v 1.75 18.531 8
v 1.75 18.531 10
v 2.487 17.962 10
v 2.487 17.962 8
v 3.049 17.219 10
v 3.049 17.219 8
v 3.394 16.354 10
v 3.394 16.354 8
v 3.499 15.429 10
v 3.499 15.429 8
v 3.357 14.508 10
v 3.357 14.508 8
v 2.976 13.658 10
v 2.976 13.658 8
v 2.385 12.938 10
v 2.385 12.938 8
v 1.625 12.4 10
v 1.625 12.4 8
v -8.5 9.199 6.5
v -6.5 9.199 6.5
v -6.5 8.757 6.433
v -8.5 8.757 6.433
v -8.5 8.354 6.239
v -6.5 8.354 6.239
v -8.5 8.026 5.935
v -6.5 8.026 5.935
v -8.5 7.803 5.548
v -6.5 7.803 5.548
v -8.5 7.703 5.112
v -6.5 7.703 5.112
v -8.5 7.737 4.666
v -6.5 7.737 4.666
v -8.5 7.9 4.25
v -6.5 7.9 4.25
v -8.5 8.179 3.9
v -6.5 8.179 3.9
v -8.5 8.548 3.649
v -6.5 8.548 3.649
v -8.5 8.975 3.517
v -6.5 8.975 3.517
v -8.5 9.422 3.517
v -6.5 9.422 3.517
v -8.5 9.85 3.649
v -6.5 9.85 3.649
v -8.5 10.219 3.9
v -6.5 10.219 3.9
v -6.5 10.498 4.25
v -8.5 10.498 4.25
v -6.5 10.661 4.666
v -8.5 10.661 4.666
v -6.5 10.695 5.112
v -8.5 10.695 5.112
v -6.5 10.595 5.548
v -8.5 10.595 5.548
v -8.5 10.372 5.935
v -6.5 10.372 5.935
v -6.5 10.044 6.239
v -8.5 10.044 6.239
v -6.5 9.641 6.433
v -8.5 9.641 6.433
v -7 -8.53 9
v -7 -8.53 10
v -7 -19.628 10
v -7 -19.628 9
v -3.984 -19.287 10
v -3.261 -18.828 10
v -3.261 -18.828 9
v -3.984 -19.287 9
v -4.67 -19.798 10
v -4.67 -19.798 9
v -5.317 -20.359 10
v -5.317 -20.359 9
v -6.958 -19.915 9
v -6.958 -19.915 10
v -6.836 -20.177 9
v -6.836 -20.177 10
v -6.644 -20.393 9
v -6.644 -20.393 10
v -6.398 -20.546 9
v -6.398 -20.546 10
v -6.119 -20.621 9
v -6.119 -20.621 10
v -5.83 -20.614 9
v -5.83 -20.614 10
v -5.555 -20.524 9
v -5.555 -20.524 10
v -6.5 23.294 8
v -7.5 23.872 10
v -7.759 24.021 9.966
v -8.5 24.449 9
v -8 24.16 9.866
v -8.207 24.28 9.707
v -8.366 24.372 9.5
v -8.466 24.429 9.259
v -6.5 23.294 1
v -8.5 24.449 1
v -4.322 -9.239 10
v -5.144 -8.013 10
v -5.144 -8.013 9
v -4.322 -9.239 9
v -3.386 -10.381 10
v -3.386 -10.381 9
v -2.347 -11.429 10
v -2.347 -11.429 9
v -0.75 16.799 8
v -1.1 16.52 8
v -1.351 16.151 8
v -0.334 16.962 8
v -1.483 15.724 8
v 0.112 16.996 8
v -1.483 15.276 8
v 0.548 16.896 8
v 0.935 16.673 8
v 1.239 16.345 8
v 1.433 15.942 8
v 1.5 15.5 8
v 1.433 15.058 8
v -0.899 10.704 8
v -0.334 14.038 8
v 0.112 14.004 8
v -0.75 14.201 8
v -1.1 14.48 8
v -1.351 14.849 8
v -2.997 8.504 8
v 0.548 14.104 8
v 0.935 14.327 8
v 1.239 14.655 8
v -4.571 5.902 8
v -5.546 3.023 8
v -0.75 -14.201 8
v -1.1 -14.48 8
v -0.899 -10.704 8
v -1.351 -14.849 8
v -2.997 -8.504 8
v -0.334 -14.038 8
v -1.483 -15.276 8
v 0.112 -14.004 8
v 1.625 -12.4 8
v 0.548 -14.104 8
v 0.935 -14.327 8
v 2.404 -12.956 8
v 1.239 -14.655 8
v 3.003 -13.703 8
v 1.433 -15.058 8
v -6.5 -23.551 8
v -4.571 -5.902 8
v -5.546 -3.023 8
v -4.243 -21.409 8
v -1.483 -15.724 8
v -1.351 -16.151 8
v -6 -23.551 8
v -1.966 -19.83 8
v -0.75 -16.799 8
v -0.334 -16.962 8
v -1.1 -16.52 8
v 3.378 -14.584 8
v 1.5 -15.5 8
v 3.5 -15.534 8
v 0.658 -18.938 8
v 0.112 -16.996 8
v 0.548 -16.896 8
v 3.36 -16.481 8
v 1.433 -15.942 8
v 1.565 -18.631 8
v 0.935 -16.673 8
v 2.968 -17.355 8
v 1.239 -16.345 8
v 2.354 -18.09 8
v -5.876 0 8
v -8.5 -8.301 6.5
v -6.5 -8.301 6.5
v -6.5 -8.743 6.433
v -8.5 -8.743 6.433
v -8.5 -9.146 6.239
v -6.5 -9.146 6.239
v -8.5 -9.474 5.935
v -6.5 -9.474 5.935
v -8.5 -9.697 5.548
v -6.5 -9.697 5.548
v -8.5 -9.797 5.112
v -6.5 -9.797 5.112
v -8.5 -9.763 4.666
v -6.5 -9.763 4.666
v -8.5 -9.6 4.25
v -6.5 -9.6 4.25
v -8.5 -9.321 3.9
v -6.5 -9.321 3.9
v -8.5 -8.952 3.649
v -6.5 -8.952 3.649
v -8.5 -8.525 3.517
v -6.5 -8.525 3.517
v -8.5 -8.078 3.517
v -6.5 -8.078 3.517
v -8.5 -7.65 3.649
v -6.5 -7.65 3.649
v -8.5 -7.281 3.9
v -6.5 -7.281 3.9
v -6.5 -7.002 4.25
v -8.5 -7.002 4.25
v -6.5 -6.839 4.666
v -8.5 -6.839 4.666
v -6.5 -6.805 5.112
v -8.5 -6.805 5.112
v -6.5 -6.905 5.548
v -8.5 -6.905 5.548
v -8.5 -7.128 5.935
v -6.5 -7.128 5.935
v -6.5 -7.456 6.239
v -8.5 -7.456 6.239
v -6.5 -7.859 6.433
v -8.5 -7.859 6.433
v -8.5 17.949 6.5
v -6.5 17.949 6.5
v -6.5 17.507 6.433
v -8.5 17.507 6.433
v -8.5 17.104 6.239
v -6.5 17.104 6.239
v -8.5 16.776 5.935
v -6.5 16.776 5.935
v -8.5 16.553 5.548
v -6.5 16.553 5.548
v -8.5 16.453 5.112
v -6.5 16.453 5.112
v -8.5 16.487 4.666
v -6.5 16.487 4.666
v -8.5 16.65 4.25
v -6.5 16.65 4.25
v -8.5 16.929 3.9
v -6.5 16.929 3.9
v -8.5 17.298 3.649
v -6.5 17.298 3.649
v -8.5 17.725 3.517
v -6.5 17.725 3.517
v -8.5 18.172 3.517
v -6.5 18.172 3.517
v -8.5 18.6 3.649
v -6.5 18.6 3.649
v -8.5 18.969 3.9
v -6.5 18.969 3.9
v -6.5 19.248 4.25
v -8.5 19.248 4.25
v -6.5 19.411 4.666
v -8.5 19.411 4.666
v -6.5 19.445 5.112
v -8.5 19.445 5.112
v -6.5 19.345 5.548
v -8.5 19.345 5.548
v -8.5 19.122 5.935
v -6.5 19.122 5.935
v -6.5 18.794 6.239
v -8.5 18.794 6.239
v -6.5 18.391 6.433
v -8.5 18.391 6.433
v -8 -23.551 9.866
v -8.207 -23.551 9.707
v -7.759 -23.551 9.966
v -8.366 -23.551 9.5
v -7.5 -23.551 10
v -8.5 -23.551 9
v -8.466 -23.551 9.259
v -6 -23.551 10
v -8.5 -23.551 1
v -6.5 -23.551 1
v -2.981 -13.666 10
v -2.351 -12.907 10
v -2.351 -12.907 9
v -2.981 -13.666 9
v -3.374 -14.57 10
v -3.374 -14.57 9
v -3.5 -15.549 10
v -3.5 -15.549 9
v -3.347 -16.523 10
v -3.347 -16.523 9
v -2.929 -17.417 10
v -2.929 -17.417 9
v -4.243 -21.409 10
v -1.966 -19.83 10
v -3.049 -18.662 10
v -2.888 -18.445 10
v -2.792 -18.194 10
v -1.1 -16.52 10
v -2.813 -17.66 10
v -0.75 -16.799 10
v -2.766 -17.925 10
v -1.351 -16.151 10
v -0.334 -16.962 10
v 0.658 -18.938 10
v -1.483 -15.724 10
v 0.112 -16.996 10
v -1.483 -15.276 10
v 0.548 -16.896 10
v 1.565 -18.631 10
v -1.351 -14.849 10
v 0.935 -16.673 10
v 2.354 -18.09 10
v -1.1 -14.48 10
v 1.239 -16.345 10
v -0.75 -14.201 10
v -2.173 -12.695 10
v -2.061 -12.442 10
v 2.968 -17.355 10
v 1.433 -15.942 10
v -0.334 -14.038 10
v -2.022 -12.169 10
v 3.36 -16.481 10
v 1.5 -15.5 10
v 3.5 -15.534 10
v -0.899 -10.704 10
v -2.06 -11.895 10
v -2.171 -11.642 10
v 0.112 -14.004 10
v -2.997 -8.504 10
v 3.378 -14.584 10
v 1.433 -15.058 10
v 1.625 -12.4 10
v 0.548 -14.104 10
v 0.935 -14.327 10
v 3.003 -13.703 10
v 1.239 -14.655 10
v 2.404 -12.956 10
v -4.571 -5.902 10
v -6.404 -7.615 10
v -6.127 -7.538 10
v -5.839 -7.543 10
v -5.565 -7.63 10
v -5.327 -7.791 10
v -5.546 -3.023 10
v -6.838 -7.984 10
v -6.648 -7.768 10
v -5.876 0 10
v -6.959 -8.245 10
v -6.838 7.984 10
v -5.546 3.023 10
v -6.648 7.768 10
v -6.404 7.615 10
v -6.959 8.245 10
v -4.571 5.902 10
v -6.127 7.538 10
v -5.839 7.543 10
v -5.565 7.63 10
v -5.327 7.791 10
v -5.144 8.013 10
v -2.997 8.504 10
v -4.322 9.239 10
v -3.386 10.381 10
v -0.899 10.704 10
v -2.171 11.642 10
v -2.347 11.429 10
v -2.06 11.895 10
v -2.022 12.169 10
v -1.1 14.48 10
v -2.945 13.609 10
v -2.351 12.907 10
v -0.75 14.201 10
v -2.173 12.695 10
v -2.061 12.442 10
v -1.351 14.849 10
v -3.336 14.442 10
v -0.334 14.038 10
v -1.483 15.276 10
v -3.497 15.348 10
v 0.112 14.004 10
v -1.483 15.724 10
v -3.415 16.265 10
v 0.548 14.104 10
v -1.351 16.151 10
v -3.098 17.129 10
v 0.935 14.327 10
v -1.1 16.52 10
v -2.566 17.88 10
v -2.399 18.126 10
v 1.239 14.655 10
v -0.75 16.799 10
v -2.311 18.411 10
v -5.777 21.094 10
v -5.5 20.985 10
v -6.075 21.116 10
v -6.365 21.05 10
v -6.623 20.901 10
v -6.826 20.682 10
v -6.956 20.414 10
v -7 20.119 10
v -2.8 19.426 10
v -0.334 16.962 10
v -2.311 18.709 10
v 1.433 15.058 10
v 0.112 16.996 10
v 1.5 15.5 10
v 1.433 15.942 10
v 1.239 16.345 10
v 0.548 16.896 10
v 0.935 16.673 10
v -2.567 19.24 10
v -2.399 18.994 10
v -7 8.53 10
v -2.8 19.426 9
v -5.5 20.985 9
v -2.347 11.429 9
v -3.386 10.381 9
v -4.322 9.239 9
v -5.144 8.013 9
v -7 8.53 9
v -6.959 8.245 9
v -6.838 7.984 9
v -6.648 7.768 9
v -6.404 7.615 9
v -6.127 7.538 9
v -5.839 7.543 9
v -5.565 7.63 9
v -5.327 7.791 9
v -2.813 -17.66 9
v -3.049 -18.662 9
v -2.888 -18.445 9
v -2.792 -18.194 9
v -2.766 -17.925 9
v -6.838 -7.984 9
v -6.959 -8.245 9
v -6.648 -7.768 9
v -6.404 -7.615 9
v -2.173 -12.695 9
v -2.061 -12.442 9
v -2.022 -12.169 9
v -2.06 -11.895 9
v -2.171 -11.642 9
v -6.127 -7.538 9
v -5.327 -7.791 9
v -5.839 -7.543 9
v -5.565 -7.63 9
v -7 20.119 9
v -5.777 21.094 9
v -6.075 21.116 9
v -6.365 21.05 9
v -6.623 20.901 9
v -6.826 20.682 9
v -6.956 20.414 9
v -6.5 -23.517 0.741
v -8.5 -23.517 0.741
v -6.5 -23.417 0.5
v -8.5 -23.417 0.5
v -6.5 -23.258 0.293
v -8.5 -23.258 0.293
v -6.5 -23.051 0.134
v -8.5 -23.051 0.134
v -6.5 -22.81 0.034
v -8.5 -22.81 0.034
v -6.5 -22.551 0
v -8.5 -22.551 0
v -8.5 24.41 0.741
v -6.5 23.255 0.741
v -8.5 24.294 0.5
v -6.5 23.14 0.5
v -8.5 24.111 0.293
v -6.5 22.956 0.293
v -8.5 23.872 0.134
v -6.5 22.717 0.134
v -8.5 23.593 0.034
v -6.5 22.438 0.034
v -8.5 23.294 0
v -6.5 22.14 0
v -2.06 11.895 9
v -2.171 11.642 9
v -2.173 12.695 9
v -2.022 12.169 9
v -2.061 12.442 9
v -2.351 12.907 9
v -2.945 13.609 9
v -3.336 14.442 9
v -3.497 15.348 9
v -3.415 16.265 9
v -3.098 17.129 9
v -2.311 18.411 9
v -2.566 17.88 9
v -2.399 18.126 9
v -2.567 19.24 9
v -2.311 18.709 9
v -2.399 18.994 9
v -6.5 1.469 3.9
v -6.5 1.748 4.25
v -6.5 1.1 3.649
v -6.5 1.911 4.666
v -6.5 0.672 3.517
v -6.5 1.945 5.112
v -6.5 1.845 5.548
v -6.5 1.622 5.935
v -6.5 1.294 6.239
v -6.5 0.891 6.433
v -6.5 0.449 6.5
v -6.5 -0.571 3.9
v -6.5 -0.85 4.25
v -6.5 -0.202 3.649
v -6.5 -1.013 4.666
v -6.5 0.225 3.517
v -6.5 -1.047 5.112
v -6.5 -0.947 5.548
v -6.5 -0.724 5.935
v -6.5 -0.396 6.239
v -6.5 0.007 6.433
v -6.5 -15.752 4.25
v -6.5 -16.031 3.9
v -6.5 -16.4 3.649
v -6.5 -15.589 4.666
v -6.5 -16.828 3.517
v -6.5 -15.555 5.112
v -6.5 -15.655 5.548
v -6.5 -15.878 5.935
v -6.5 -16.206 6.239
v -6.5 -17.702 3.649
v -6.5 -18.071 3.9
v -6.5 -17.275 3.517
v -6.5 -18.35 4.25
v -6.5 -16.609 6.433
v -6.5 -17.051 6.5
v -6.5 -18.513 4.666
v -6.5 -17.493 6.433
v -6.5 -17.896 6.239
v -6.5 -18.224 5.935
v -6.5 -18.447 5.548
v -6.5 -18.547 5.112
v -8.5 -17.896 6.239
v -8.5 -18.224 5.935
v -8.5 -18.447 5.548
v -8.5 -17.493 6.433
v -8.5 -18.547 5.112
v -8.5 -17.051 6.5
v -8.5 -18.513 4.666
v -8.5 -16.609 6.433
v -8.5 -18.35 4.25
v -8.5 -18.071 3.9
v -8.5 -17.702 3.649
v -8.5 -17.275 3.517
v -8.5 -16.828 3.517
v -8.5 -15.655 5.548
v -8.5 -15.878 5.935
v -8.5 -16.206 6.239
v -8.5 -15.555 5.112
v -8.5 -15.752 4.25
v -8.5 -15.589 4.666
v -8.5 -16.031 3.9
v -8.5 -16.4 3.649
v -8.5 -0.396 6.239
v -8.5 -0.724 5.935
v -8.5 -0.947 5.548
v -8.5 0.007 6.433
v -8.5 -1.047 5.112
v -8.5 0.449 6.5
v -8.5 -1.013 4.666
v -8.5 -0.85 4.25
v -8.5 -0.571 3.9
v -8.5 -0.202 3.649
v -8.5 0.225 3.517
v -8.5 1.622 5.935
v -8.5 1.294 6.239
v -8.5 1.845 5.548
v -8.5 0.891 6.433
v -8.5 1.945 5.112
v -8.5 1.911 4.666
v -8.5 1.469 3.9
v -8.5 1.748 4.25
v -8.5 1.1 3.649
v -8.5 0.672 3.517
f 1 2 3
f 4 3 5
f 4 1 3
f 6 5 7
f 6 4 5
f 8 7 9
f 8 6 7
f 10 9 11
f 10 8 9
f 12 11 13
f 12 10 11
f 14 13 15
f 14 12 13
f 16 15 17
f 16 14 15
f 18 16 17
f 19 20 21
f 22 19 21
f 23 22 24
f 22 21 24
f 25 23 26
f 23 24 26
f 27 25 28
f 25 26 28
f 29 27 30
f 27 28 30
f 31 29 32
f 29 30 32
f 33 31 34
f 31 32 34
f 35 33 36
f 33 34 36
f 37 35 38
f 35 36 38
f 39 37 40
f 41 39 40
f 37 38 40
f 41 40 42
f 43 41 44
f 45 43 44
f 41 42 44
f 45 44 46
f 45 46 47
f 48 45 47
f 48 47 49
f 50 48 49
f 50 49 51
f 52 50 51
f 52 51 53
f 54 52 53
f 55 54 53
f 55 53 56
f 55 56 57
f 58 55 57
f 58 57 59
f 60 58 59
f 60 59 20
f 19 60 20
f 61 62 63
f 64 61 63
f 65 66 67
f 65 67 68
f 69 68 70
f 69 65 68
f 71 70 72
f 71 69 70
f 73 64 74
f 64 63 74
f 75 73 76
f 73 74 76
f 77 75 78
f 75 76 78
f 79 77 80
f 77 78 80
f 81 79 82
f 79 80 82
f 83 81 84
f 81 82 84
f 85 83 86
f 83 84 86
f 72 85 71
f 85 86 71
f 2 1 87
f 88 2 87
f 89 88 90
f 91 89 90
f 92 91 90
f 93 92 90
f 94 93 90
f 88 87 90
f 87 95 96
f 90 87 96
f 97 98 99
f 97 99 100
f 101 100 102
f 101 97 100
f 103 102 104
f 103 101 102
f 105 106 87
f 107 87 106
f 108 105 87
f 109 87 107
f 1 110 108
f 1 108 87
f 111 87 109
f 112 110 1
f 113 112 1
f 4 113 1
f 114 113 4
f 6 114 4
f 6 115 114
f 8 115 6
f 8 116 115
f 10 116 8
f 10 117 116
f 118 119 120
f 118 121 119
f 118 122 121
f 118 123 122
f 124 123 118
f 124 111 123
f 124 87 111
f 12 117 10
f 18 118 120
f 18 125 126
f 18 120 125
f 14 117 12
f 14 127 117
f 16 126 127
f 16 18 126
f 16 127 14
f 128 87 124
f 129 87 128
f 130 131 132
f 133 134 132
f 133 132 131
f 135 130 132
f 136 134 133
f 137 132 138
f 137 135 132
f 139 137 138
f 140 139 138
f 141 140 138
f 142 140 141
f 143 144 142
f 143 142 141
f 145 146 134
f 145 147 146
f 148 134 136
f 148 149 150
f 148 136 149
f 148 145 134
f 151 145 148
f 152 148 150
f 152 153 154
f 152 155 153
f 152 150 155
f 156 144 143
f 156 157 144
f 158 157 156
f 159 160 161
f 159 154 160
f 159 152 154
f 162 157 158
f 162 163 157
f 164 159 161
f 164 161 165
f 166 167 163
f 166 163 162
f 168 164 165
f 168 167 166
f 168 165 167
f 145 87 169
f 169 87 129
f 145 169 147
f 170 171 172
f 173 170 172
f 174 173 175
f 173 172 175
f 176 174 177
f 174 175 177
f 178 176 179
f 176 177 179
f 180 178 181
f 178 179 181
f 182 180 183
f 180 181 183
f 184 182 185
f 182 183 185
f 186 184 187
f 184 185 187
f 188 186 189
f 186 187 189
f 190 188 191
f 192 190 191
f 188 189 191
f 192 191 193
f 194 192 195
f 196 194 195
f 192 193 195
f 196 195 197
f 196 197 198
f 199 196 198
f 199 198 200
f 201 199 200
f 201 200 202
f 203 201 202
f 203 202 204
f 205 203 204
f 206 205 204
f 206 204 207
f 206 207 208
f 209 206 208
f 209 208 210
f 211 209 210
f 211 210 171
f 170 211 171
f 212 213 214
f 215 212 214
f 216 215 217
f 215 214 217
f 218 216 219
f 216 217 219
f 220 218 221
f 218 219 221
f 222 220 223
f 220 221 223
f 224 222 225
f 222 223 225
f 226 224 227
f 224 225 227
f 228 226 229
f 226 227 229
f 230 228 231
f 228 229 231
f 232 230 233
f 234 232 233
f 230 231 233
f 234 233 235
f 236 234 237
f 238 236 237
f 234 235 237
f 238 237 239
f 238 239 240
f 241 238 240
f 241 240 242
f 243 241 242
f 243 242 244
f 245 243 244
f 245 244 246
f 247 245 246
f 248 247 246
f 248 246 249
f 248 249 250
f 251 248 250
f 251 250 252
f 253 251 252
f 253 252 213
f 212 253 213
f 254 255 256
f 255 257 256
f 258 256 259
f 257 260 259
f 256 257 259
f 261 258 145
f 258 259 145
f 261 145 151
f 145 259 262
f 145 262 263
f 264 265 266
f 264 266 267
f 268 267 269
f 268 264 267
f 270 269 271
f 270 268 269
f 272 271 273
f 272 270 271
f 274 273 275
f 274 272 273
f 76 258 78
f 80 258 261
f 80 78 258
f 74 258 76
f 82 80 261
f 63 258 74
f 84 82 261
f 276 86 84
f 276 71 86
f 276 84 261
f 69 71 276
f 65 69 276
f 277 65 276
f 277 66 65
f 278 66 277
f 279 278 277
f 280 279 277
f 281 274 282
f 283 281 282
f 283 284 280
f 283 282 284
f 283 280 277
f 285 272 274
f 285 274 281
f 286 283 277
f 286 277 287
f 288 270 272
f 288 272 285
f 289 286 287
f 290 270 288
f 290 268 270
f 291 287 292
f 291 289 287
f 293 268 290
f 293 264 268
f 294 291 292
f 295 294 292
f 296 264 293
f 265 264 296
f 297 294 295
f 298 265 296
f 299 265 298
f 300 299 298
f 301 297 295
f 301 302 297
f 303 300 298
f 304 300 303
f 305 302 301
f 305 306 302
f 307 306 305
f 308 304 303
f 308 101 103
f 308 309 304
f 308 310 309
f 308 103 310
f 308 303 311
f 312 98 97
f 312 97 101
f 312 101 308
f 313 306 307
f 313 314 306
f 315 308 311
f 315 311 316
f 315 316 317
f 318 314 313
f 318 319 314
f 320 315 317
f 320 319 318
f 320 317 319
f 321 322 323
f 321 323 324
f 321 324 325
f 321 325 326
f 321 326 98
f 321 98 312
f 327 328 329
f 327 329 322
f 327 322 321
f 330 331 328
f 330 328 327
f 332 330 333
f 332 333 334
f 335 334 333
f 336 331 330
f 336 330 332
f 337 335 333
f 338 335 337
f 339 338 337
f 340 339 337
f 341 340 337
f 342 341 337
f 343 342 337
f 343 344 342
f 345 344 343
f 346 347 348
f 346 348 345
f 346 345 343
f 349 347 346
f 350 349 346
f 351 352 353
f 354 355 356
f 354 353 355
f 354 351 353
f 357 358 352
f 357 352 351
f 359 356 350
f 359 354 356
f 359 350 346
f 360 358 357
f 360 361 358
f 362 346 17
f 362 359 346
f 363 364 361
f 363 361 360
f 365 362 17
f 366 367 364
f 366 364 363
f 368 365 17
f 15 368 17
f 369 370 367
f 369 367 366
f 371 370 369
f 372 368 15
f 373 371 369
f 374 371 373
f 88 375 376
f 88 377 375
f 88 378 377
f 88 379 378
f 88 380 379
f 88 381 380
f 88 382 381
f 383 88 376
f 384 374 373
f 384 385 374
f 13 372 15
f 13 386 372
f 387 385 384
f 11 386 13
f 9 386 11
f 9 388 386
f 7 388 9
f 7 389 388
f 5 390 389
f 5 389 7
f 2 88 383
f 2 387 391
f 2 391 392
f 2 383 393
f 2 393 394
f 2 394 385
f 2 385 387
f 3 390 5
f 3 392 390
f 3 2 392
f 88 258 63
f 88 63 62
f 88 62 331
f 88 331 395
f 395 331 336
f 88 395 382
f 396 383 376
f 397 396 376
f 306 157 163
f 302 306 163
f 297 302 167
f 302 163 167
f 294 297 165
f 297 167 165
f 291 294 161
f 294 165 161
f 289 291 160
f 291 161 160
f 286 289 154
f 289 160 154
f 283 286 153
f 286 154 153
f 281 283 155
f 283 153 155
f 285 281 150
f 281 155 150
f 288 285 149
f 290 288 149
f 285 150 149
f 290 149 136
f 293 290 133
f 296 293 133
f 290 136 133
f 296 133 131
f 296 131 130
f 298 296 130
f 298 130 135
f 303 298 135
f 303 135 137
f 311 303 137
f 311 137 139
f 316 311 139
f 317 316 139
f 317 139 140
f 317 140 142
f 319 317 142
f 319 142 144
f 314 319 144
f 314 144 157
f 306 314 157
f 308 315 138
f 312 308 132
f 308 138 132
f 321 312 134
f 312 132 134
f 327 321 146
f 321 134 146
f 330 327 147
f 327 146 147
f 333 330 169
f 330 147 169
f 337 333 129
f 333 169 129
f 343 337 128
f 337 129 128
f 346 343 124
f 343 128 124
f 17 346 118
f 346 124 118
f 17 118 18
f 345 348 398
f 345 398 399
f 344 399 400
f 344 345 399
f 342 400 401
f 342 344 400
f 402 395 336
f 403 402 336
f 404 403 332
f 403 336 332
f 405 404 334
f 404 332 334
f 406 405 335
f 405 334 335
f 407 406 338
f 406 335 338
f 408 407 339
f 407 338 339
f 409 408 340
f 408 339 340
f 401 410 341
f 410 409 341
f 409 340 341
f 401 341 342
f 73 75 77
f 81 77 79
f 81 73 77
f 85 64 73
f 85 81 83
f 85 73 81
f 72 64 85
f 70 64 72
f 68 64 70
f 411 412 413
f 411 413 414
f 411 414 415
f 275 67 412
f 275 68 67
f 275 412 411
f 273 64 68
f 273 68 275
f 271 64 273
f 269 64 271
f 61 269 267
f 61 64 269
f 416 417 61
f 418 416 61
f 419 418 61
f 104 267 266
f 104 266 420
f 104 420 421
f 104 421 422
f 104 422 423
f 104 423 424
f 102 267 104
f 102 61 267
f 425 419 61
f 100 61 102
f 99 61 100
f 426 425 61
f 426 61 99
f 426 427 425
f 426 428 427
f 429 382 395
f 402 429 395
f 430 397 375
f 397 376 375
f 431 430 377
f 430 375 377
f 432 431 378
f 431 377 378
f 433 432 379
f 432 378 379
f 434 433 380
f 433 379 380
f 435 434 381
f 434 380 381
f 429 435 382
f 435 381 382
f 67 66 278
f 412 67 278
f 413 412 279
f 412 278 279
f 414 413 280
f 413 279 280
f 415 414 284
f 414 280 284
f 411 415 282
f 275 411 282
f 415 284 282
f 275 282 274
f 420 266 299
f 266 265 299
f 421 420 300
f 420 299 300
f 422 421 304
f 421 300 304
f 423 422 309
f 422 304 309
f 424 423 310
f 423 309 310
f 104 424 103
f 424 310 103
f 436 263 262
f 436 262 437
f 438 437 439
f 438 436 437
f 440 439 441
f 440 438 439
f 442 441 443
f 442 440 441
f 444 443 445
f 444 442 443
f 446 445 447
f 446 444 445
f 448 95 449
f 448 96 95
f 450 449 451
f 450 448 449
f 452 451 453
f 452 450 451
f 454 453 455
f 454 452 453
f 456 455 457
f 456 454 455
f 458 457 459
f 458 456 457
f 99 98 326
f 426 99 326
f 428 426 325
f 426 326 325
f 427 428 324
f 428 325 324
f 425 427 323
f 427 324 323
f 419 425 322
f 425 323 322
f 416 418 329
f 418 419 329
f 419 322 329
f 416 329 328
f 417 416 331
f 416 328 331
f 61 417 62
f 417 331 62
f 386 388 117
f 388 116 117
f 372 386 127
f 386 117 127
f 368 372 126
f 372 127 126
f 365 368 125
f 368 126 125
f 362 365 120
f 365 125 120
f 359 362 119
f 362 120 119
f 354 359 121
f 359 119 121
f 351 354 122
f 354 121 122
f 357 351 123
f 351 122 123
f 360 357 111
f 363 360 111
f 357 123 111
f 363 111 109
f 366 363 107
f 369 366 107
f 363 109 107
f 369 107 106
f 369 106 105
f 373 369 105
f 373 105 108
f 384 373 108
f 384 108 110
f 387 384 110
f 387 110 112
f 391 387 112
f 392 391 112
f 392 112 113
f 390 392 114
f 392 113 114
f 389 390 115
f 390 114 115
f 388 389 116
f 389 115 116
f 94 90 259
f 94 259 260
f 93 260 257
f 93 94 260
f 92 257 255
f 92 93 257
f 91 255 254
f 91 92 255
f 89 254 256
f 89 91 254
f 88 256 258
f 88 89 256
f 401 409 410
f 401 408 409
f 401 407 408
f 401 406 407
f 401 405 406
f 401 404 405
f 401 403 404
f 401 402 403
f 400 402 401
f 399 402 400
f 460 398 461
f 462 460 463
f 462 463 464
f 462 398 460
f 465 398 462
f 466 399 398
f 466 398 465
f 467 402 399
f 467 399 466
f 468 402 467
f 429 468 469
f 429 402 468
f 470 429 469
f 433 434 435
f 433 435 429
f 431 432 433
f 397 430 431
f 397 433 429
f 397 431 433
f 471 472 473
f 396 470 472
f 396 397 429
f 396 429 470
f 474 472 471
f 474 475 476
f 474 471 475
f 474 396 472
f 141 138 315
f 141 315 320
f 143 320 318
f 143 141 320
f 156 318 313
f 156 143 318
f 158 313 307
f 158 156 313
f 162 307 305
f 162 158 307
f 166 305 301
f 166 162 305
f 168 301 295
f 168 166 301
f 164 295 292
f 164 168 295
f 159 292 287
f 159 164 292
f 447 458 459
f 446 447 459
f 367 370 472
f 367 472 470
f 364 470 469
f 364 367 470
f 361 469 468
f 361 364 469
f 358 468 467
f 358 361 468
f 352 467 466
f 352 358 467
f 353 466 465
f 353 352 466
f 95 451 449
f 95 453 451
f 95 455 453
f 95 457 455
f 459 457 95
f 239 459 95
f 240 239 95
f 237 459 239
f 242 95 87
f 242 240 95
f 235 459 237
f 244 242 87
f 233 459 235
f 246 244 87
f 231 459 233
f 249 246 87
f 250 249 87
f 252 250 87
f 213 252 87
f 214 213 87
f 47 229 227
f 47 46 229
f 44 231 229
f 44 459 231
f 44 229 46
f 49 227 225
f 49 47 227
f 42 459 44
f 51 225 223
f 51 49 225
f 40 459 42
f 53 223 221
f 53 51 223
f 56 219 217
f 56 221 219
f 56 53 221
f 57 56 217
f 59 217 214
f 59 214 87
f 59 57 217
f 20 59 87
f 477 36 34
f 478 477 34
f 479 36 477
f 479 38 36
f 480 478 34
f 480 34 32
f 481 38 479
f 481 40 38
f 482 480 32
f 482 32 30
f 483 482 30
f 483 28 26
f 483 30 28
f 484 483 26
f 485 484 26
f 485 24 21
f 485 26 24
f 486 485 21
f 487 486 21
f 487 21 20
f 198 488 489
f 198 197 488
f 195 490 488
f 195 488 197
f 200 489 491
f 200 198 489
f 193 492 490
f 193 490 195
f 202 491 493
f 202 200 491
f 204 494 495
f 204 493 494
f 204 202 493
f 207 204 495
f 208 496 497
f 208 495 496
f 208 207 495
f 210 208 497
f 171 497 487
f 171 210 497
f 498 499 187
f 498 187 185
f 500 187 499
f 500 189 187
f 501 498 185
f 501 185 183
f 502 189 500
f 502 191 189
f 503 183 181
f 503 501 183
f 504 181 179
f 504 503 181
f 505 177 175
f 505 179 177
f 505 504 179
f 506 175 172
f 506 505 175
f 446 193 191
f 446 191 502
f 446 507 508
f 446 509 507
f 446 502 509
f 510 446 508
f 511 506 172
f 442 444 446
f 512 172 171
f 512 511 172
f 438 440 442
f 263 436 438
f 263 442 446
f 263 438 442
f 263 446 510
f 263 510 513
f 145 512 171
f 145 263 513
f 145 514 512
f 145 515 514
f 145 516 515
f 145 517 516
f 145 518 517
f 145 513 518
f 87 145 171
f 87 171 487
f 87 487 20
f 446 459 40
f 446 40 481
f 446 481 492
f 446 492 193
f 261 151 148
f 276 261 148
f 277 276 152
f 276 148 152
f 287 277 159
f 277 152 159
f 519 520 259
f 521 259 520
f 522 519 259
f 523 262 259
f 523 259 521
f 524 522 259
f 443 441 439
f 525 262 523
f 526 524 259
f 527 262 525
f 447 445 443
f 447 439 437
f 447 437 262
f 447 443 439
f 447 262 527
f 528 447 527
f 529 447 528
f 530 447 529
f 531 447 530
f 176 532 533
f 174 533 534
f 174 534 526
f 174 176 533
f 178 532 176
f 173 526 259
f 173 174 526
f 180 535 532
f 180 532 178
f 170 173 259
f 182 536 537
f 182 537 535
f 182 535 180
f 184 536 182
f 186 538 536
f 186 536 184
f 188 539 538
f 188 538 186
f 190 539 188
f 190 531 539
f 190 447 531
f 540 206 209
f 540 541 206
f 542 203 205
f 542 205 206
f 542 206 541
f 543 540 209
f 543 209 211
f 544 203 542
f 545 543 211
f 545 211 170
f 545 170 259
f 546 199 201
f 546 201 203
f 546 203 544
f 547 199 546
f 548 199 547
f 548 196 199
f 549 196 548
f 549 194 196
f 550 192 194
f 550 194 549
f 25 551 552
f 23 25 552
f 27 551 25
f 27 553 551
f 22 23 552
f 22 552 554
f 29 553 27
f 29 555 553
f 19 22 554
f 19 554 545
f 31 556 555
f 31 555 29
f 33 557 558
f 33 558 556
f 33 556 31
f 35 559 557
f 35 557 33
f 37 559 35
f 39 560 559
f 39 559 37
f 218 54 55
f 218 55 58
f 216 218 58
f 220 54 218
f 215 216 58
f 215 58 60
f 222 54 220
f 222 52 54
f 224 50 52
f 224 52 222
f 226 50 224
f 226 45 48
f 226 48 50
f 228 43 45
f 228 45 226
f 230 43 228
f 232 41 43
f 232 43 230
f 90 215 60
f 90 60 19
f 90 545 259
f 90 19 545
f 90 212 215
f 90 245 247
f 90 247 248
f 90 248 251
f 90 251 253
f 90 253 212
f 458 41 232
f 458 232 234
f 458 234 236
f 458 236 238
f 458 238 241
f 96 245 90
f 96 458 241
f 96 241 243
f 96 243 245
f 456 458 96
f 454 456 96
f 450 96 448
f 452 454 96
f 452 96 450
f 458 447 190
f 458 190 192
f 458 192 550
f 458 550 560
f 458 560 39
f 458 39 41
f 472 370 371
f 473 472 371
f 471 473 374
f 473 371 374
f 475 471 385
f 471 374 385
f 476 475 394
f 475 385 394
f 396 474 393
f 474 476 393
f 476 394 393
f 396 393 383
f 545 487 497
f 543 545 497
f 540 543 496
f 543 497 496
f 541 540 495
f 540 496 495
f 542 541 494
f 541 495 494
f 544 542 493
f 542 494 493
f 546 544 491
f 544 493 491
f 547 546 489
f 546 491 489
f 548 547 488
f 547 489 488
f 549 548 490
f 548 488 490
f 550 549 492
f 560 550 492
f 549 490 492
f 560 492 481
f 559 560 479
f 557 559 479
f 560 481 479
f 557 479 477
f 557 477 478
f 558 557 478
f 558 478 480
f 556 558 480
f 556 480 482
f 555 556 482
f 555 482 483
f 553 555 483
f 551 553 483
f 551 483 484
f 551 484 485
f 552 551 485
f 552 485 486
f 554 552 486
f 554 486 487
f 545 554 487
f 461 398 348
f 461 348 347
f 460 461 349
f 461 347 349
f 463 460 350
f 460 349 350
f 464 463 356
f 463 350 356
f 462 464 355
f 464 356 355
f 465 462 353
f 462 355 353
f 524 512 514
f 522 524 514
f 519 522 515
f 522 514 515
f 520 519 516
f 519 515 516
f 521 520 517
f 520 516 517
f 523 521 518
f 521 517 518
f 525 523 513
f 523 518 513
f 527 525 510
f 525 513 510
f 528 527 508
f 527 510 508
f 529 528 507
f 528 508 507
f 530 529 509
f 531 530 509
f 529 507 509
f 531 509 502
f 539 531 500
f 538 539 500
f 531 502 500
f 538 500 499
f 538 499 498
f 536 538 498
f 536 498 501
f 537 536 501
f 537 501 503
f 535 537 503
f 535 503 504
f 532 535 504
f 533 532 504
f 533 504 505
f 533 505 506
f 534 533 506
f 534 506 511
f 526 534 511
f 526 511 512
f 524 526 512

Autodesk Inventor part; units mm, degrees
ref_plane "YZ Plane" through (0, 0, 0) normal (1, 0, 0) x (0, 1, 0)
ref_plane "XZ Plane" through (0, 0, 0) normal (0, 1, 0) x (-1, 0, 0)
ref_plane "XY Plane" through (0, 0, 0) normal (0, 0, 1) x (1, 0, 0)
sketch "TopProfile" plane through (0, 0, 0) normal (0, 0, 1) x (1, 0, 0)
  circle A0 centre (0, 15.5) radius 3.5
  circle A1 centre (0, -15.5) radius 3.5
  line L0 (1.75, 18.5311) -> (-8.5, 24.4489)
  line L1 (-8.5, -23.5511) -> (-8.5, 24.4489)
  arc A2 (1.6248, 12.4) -> (1.6248, -12.4) centre (8.124, 0) ccw
  line L2 (-8.5, -23.5511) -> (-6, -23.5511)
  arc A3 (0.6576, -18.9377) -> (-6, -23.5511) centre (2.5365, -28.7596) ccw
  line L3 (0, -15.5) -> (0, 15.5) construction
  circle A4 centre (0, 15.5) radius 1.5
  circle A5 centre (0, -15.5) radius 1.5
  point P0 (0, 0)
  point P1 (0, 0)
  dimension "d1" = 7
  dimension "d3" = 2.5
  dimension "d4" = 60
  dimension "d5" = 48
  dimension "d6" = 14
  dimension "d7" = 31
  dimension "d9" = 8.5
  dimension "d10" = 3
  dimension "d12" = 10
extrude "TopProfileFeature" add sketch "TopProfile" along normal blind 10
sketch "FrontProfile" plane through (-8.5, -23.5511, 0) normal (0, -1, 0) x (1, 0, 0)
  line L0 (0, 0) -> (0, 10) construction
  line L1 (0, 10) -> (2.5, 10) projected
  line L2 (12, 0) -> (12, 10) construction
  line L3 (0, 10) -> (12, 10)
  line L4 (12, 10) -> (9.1576, 10) projected
  line L5 (0, 10) -> (0, 0)
  line L6 (0, 0) -> (2, 0)
  line L7 (2, 0) -> (2, 8)
  line L8 (2, 8) -> (12, 8)
  line L9 (12, 10) -> (12, 8)
  line L10 (0, 0) -> (2.5, 0) projected
  point P0 (10.1248, 10)
  dimension "d16" = 2
  dimension "d45" = 2
extrude "FrontProfileFeature" cut sketch "FrontProfile" against normal through all keep common part
fillet "SideFilletFeature" radius 1 1 edges at (-8.5, 0.4489, 10)
sketch "Sinks" plane through (0, 0, 10) normal (0, 0, 1) x (1, 0, 0)
  circle A0 centre (0, 15.5) radius 1.5 construction
  circle A1 centre (0, -15.5) radius 1.5 construction
  circle A2 centre (0, 15.5) radius 3.5
  circle A3 centre (0, -15.5) radius 3.5
  line L0 (-1.4875, 18.6682) -> (-7, 21.8509)
  line L1 (-7, 21.8509) -> (-7, 4)
  arc A4 (-1.3472, 12.2697) -> (-6.8509, 4) centre (8.124, 0) ccw
  line L2 (1.75, 18.5311) -> (-7.5, 23.8716) construction
  line L3 (-8.5, 24.4489) -> (-8.5, -23.5511) construction
  arc A5 (1.6248, 12.4) -> (1.6248, -12.4) centre (8.124, 0) ccw construction
  line L4 (-7, -4) -> (-7, -22.3326)
  arc A6 (-6.8509, -4) -> (-1.3472, -12.2697) centre (8.124, 0) ccw
  arc A7 (-2.1532, -18.2593) -> (-7, -22.3326) centre (2.5365, -28.7596) ccw
  arc A8 (0.6576, -18.9377) -> (-6, -23.5511) centre (2.5365, -28.7596) ccw construction
  line L5 (-7, 4) -> (-6.8509, 4)
  line L6 (-6.8509, -4) -> (-7, -4)
  arc A9 (1.6248, 12.4) -> (1.6248, -12.4) centre (8.124, 0) ccw construction
  line L7 (-5.876, 0) -> (-8.5, 0) construction
  line L8 (-8.5, 24.4489) -> (-8.5, -23.5511) construction
  point P0 (0, 0)
  dimension "d20" = 1.5
  dimension "d21" = 1.5
  dimension "d22" = 1.5
  dimension "d23" = 1.5
  dimension "d24" = 1.5
  dimension "d50" = 4
  dimension "d51" = 4
extrude "SinksFeature" cut sketch "Sinks" against normal blind 1 contours A2 A4 L5 L1 L0 | A3 A7 L4 L6 A6
fillet "SinkFilletsFeature" radius 1 10 edges at (-7, 21.8509, 9.5) (-7, 4, 9.5) (-1.3472, 12.2697, 9.5) (-1.4875, 18.6682, 9.5) (-7, -22.3326, 9.5) (-7, -4, 9.5) (-1.3472, -12.2697, 9.5) (-2.1532, -18.2593, 9.5) (-6.8509, 4, 9.5) (-6.8509, -4, 9.5)
sketch "SideHoles" plane through (-8.5, -23.5511, 0) normal (-1, 0, 0) x (0, 0, 1)
  line L0 (10, 0) -> (10, 47.4226) construction
  line L1 (0, 48) -> (9, 48) construction
  circle A0 centre (5, 41.5) radius 1.75
  line L2 (5, 41.5) -> (5, 6.5) construction
  circle A1 centre (5, 24) radius 1.75
  circle A2 centre (5, 6.5) radius 1.75
  line L3 (5, 24) -> (0, 24) construction
  circle A3 centre (5, 15.25) radius 1.75
  circle A4 centre (5, 32.75) radius 1.75
  line L4 (0, 48) -> (0, 0) construction
  line L5 (8, 0) -> (0, 0) projected
  dimension "d28" = 3.5
  dimension "d30" = 5
  dimension "d33" = 35
  dimension "d43" = 8.75
  dimension "d44" = 8.75
  dimension "d46" = 5
  dimension "d47" = 6.5
  dimension "d48" = 6.5
hole "SideHolesFeature" at (-8.5, 17.9489, 5) at (-8.5, 0.4489, 5) at (-8.5, -17.0511, 5) at (-8.5, 9.1989, 5) at (-8.5, -8.3011, 5) direction (1, 0, 0) diameter 3 end through all
fillet "BottomCornerFilletsFeature" radius 1 2 edges at (-7.5, -23.5511, 0) (-7.5, 23.8716, 0)
equation "\"d21\" = d20"
equation "\"d22\" = d20"
equation "\"d23\" = d20"
equation "\"d24\" = d20"
equation "\"d51\" = d50"
equation "\"d30\" = 0.5 * d29"
equation "\"d43\" = 0.25 * d33"
equation "\"d44\" = d43"
equation "\"d47\" = d48"
equation "\"d29\" = 10"
properties part number "SpineMiddleCover"
